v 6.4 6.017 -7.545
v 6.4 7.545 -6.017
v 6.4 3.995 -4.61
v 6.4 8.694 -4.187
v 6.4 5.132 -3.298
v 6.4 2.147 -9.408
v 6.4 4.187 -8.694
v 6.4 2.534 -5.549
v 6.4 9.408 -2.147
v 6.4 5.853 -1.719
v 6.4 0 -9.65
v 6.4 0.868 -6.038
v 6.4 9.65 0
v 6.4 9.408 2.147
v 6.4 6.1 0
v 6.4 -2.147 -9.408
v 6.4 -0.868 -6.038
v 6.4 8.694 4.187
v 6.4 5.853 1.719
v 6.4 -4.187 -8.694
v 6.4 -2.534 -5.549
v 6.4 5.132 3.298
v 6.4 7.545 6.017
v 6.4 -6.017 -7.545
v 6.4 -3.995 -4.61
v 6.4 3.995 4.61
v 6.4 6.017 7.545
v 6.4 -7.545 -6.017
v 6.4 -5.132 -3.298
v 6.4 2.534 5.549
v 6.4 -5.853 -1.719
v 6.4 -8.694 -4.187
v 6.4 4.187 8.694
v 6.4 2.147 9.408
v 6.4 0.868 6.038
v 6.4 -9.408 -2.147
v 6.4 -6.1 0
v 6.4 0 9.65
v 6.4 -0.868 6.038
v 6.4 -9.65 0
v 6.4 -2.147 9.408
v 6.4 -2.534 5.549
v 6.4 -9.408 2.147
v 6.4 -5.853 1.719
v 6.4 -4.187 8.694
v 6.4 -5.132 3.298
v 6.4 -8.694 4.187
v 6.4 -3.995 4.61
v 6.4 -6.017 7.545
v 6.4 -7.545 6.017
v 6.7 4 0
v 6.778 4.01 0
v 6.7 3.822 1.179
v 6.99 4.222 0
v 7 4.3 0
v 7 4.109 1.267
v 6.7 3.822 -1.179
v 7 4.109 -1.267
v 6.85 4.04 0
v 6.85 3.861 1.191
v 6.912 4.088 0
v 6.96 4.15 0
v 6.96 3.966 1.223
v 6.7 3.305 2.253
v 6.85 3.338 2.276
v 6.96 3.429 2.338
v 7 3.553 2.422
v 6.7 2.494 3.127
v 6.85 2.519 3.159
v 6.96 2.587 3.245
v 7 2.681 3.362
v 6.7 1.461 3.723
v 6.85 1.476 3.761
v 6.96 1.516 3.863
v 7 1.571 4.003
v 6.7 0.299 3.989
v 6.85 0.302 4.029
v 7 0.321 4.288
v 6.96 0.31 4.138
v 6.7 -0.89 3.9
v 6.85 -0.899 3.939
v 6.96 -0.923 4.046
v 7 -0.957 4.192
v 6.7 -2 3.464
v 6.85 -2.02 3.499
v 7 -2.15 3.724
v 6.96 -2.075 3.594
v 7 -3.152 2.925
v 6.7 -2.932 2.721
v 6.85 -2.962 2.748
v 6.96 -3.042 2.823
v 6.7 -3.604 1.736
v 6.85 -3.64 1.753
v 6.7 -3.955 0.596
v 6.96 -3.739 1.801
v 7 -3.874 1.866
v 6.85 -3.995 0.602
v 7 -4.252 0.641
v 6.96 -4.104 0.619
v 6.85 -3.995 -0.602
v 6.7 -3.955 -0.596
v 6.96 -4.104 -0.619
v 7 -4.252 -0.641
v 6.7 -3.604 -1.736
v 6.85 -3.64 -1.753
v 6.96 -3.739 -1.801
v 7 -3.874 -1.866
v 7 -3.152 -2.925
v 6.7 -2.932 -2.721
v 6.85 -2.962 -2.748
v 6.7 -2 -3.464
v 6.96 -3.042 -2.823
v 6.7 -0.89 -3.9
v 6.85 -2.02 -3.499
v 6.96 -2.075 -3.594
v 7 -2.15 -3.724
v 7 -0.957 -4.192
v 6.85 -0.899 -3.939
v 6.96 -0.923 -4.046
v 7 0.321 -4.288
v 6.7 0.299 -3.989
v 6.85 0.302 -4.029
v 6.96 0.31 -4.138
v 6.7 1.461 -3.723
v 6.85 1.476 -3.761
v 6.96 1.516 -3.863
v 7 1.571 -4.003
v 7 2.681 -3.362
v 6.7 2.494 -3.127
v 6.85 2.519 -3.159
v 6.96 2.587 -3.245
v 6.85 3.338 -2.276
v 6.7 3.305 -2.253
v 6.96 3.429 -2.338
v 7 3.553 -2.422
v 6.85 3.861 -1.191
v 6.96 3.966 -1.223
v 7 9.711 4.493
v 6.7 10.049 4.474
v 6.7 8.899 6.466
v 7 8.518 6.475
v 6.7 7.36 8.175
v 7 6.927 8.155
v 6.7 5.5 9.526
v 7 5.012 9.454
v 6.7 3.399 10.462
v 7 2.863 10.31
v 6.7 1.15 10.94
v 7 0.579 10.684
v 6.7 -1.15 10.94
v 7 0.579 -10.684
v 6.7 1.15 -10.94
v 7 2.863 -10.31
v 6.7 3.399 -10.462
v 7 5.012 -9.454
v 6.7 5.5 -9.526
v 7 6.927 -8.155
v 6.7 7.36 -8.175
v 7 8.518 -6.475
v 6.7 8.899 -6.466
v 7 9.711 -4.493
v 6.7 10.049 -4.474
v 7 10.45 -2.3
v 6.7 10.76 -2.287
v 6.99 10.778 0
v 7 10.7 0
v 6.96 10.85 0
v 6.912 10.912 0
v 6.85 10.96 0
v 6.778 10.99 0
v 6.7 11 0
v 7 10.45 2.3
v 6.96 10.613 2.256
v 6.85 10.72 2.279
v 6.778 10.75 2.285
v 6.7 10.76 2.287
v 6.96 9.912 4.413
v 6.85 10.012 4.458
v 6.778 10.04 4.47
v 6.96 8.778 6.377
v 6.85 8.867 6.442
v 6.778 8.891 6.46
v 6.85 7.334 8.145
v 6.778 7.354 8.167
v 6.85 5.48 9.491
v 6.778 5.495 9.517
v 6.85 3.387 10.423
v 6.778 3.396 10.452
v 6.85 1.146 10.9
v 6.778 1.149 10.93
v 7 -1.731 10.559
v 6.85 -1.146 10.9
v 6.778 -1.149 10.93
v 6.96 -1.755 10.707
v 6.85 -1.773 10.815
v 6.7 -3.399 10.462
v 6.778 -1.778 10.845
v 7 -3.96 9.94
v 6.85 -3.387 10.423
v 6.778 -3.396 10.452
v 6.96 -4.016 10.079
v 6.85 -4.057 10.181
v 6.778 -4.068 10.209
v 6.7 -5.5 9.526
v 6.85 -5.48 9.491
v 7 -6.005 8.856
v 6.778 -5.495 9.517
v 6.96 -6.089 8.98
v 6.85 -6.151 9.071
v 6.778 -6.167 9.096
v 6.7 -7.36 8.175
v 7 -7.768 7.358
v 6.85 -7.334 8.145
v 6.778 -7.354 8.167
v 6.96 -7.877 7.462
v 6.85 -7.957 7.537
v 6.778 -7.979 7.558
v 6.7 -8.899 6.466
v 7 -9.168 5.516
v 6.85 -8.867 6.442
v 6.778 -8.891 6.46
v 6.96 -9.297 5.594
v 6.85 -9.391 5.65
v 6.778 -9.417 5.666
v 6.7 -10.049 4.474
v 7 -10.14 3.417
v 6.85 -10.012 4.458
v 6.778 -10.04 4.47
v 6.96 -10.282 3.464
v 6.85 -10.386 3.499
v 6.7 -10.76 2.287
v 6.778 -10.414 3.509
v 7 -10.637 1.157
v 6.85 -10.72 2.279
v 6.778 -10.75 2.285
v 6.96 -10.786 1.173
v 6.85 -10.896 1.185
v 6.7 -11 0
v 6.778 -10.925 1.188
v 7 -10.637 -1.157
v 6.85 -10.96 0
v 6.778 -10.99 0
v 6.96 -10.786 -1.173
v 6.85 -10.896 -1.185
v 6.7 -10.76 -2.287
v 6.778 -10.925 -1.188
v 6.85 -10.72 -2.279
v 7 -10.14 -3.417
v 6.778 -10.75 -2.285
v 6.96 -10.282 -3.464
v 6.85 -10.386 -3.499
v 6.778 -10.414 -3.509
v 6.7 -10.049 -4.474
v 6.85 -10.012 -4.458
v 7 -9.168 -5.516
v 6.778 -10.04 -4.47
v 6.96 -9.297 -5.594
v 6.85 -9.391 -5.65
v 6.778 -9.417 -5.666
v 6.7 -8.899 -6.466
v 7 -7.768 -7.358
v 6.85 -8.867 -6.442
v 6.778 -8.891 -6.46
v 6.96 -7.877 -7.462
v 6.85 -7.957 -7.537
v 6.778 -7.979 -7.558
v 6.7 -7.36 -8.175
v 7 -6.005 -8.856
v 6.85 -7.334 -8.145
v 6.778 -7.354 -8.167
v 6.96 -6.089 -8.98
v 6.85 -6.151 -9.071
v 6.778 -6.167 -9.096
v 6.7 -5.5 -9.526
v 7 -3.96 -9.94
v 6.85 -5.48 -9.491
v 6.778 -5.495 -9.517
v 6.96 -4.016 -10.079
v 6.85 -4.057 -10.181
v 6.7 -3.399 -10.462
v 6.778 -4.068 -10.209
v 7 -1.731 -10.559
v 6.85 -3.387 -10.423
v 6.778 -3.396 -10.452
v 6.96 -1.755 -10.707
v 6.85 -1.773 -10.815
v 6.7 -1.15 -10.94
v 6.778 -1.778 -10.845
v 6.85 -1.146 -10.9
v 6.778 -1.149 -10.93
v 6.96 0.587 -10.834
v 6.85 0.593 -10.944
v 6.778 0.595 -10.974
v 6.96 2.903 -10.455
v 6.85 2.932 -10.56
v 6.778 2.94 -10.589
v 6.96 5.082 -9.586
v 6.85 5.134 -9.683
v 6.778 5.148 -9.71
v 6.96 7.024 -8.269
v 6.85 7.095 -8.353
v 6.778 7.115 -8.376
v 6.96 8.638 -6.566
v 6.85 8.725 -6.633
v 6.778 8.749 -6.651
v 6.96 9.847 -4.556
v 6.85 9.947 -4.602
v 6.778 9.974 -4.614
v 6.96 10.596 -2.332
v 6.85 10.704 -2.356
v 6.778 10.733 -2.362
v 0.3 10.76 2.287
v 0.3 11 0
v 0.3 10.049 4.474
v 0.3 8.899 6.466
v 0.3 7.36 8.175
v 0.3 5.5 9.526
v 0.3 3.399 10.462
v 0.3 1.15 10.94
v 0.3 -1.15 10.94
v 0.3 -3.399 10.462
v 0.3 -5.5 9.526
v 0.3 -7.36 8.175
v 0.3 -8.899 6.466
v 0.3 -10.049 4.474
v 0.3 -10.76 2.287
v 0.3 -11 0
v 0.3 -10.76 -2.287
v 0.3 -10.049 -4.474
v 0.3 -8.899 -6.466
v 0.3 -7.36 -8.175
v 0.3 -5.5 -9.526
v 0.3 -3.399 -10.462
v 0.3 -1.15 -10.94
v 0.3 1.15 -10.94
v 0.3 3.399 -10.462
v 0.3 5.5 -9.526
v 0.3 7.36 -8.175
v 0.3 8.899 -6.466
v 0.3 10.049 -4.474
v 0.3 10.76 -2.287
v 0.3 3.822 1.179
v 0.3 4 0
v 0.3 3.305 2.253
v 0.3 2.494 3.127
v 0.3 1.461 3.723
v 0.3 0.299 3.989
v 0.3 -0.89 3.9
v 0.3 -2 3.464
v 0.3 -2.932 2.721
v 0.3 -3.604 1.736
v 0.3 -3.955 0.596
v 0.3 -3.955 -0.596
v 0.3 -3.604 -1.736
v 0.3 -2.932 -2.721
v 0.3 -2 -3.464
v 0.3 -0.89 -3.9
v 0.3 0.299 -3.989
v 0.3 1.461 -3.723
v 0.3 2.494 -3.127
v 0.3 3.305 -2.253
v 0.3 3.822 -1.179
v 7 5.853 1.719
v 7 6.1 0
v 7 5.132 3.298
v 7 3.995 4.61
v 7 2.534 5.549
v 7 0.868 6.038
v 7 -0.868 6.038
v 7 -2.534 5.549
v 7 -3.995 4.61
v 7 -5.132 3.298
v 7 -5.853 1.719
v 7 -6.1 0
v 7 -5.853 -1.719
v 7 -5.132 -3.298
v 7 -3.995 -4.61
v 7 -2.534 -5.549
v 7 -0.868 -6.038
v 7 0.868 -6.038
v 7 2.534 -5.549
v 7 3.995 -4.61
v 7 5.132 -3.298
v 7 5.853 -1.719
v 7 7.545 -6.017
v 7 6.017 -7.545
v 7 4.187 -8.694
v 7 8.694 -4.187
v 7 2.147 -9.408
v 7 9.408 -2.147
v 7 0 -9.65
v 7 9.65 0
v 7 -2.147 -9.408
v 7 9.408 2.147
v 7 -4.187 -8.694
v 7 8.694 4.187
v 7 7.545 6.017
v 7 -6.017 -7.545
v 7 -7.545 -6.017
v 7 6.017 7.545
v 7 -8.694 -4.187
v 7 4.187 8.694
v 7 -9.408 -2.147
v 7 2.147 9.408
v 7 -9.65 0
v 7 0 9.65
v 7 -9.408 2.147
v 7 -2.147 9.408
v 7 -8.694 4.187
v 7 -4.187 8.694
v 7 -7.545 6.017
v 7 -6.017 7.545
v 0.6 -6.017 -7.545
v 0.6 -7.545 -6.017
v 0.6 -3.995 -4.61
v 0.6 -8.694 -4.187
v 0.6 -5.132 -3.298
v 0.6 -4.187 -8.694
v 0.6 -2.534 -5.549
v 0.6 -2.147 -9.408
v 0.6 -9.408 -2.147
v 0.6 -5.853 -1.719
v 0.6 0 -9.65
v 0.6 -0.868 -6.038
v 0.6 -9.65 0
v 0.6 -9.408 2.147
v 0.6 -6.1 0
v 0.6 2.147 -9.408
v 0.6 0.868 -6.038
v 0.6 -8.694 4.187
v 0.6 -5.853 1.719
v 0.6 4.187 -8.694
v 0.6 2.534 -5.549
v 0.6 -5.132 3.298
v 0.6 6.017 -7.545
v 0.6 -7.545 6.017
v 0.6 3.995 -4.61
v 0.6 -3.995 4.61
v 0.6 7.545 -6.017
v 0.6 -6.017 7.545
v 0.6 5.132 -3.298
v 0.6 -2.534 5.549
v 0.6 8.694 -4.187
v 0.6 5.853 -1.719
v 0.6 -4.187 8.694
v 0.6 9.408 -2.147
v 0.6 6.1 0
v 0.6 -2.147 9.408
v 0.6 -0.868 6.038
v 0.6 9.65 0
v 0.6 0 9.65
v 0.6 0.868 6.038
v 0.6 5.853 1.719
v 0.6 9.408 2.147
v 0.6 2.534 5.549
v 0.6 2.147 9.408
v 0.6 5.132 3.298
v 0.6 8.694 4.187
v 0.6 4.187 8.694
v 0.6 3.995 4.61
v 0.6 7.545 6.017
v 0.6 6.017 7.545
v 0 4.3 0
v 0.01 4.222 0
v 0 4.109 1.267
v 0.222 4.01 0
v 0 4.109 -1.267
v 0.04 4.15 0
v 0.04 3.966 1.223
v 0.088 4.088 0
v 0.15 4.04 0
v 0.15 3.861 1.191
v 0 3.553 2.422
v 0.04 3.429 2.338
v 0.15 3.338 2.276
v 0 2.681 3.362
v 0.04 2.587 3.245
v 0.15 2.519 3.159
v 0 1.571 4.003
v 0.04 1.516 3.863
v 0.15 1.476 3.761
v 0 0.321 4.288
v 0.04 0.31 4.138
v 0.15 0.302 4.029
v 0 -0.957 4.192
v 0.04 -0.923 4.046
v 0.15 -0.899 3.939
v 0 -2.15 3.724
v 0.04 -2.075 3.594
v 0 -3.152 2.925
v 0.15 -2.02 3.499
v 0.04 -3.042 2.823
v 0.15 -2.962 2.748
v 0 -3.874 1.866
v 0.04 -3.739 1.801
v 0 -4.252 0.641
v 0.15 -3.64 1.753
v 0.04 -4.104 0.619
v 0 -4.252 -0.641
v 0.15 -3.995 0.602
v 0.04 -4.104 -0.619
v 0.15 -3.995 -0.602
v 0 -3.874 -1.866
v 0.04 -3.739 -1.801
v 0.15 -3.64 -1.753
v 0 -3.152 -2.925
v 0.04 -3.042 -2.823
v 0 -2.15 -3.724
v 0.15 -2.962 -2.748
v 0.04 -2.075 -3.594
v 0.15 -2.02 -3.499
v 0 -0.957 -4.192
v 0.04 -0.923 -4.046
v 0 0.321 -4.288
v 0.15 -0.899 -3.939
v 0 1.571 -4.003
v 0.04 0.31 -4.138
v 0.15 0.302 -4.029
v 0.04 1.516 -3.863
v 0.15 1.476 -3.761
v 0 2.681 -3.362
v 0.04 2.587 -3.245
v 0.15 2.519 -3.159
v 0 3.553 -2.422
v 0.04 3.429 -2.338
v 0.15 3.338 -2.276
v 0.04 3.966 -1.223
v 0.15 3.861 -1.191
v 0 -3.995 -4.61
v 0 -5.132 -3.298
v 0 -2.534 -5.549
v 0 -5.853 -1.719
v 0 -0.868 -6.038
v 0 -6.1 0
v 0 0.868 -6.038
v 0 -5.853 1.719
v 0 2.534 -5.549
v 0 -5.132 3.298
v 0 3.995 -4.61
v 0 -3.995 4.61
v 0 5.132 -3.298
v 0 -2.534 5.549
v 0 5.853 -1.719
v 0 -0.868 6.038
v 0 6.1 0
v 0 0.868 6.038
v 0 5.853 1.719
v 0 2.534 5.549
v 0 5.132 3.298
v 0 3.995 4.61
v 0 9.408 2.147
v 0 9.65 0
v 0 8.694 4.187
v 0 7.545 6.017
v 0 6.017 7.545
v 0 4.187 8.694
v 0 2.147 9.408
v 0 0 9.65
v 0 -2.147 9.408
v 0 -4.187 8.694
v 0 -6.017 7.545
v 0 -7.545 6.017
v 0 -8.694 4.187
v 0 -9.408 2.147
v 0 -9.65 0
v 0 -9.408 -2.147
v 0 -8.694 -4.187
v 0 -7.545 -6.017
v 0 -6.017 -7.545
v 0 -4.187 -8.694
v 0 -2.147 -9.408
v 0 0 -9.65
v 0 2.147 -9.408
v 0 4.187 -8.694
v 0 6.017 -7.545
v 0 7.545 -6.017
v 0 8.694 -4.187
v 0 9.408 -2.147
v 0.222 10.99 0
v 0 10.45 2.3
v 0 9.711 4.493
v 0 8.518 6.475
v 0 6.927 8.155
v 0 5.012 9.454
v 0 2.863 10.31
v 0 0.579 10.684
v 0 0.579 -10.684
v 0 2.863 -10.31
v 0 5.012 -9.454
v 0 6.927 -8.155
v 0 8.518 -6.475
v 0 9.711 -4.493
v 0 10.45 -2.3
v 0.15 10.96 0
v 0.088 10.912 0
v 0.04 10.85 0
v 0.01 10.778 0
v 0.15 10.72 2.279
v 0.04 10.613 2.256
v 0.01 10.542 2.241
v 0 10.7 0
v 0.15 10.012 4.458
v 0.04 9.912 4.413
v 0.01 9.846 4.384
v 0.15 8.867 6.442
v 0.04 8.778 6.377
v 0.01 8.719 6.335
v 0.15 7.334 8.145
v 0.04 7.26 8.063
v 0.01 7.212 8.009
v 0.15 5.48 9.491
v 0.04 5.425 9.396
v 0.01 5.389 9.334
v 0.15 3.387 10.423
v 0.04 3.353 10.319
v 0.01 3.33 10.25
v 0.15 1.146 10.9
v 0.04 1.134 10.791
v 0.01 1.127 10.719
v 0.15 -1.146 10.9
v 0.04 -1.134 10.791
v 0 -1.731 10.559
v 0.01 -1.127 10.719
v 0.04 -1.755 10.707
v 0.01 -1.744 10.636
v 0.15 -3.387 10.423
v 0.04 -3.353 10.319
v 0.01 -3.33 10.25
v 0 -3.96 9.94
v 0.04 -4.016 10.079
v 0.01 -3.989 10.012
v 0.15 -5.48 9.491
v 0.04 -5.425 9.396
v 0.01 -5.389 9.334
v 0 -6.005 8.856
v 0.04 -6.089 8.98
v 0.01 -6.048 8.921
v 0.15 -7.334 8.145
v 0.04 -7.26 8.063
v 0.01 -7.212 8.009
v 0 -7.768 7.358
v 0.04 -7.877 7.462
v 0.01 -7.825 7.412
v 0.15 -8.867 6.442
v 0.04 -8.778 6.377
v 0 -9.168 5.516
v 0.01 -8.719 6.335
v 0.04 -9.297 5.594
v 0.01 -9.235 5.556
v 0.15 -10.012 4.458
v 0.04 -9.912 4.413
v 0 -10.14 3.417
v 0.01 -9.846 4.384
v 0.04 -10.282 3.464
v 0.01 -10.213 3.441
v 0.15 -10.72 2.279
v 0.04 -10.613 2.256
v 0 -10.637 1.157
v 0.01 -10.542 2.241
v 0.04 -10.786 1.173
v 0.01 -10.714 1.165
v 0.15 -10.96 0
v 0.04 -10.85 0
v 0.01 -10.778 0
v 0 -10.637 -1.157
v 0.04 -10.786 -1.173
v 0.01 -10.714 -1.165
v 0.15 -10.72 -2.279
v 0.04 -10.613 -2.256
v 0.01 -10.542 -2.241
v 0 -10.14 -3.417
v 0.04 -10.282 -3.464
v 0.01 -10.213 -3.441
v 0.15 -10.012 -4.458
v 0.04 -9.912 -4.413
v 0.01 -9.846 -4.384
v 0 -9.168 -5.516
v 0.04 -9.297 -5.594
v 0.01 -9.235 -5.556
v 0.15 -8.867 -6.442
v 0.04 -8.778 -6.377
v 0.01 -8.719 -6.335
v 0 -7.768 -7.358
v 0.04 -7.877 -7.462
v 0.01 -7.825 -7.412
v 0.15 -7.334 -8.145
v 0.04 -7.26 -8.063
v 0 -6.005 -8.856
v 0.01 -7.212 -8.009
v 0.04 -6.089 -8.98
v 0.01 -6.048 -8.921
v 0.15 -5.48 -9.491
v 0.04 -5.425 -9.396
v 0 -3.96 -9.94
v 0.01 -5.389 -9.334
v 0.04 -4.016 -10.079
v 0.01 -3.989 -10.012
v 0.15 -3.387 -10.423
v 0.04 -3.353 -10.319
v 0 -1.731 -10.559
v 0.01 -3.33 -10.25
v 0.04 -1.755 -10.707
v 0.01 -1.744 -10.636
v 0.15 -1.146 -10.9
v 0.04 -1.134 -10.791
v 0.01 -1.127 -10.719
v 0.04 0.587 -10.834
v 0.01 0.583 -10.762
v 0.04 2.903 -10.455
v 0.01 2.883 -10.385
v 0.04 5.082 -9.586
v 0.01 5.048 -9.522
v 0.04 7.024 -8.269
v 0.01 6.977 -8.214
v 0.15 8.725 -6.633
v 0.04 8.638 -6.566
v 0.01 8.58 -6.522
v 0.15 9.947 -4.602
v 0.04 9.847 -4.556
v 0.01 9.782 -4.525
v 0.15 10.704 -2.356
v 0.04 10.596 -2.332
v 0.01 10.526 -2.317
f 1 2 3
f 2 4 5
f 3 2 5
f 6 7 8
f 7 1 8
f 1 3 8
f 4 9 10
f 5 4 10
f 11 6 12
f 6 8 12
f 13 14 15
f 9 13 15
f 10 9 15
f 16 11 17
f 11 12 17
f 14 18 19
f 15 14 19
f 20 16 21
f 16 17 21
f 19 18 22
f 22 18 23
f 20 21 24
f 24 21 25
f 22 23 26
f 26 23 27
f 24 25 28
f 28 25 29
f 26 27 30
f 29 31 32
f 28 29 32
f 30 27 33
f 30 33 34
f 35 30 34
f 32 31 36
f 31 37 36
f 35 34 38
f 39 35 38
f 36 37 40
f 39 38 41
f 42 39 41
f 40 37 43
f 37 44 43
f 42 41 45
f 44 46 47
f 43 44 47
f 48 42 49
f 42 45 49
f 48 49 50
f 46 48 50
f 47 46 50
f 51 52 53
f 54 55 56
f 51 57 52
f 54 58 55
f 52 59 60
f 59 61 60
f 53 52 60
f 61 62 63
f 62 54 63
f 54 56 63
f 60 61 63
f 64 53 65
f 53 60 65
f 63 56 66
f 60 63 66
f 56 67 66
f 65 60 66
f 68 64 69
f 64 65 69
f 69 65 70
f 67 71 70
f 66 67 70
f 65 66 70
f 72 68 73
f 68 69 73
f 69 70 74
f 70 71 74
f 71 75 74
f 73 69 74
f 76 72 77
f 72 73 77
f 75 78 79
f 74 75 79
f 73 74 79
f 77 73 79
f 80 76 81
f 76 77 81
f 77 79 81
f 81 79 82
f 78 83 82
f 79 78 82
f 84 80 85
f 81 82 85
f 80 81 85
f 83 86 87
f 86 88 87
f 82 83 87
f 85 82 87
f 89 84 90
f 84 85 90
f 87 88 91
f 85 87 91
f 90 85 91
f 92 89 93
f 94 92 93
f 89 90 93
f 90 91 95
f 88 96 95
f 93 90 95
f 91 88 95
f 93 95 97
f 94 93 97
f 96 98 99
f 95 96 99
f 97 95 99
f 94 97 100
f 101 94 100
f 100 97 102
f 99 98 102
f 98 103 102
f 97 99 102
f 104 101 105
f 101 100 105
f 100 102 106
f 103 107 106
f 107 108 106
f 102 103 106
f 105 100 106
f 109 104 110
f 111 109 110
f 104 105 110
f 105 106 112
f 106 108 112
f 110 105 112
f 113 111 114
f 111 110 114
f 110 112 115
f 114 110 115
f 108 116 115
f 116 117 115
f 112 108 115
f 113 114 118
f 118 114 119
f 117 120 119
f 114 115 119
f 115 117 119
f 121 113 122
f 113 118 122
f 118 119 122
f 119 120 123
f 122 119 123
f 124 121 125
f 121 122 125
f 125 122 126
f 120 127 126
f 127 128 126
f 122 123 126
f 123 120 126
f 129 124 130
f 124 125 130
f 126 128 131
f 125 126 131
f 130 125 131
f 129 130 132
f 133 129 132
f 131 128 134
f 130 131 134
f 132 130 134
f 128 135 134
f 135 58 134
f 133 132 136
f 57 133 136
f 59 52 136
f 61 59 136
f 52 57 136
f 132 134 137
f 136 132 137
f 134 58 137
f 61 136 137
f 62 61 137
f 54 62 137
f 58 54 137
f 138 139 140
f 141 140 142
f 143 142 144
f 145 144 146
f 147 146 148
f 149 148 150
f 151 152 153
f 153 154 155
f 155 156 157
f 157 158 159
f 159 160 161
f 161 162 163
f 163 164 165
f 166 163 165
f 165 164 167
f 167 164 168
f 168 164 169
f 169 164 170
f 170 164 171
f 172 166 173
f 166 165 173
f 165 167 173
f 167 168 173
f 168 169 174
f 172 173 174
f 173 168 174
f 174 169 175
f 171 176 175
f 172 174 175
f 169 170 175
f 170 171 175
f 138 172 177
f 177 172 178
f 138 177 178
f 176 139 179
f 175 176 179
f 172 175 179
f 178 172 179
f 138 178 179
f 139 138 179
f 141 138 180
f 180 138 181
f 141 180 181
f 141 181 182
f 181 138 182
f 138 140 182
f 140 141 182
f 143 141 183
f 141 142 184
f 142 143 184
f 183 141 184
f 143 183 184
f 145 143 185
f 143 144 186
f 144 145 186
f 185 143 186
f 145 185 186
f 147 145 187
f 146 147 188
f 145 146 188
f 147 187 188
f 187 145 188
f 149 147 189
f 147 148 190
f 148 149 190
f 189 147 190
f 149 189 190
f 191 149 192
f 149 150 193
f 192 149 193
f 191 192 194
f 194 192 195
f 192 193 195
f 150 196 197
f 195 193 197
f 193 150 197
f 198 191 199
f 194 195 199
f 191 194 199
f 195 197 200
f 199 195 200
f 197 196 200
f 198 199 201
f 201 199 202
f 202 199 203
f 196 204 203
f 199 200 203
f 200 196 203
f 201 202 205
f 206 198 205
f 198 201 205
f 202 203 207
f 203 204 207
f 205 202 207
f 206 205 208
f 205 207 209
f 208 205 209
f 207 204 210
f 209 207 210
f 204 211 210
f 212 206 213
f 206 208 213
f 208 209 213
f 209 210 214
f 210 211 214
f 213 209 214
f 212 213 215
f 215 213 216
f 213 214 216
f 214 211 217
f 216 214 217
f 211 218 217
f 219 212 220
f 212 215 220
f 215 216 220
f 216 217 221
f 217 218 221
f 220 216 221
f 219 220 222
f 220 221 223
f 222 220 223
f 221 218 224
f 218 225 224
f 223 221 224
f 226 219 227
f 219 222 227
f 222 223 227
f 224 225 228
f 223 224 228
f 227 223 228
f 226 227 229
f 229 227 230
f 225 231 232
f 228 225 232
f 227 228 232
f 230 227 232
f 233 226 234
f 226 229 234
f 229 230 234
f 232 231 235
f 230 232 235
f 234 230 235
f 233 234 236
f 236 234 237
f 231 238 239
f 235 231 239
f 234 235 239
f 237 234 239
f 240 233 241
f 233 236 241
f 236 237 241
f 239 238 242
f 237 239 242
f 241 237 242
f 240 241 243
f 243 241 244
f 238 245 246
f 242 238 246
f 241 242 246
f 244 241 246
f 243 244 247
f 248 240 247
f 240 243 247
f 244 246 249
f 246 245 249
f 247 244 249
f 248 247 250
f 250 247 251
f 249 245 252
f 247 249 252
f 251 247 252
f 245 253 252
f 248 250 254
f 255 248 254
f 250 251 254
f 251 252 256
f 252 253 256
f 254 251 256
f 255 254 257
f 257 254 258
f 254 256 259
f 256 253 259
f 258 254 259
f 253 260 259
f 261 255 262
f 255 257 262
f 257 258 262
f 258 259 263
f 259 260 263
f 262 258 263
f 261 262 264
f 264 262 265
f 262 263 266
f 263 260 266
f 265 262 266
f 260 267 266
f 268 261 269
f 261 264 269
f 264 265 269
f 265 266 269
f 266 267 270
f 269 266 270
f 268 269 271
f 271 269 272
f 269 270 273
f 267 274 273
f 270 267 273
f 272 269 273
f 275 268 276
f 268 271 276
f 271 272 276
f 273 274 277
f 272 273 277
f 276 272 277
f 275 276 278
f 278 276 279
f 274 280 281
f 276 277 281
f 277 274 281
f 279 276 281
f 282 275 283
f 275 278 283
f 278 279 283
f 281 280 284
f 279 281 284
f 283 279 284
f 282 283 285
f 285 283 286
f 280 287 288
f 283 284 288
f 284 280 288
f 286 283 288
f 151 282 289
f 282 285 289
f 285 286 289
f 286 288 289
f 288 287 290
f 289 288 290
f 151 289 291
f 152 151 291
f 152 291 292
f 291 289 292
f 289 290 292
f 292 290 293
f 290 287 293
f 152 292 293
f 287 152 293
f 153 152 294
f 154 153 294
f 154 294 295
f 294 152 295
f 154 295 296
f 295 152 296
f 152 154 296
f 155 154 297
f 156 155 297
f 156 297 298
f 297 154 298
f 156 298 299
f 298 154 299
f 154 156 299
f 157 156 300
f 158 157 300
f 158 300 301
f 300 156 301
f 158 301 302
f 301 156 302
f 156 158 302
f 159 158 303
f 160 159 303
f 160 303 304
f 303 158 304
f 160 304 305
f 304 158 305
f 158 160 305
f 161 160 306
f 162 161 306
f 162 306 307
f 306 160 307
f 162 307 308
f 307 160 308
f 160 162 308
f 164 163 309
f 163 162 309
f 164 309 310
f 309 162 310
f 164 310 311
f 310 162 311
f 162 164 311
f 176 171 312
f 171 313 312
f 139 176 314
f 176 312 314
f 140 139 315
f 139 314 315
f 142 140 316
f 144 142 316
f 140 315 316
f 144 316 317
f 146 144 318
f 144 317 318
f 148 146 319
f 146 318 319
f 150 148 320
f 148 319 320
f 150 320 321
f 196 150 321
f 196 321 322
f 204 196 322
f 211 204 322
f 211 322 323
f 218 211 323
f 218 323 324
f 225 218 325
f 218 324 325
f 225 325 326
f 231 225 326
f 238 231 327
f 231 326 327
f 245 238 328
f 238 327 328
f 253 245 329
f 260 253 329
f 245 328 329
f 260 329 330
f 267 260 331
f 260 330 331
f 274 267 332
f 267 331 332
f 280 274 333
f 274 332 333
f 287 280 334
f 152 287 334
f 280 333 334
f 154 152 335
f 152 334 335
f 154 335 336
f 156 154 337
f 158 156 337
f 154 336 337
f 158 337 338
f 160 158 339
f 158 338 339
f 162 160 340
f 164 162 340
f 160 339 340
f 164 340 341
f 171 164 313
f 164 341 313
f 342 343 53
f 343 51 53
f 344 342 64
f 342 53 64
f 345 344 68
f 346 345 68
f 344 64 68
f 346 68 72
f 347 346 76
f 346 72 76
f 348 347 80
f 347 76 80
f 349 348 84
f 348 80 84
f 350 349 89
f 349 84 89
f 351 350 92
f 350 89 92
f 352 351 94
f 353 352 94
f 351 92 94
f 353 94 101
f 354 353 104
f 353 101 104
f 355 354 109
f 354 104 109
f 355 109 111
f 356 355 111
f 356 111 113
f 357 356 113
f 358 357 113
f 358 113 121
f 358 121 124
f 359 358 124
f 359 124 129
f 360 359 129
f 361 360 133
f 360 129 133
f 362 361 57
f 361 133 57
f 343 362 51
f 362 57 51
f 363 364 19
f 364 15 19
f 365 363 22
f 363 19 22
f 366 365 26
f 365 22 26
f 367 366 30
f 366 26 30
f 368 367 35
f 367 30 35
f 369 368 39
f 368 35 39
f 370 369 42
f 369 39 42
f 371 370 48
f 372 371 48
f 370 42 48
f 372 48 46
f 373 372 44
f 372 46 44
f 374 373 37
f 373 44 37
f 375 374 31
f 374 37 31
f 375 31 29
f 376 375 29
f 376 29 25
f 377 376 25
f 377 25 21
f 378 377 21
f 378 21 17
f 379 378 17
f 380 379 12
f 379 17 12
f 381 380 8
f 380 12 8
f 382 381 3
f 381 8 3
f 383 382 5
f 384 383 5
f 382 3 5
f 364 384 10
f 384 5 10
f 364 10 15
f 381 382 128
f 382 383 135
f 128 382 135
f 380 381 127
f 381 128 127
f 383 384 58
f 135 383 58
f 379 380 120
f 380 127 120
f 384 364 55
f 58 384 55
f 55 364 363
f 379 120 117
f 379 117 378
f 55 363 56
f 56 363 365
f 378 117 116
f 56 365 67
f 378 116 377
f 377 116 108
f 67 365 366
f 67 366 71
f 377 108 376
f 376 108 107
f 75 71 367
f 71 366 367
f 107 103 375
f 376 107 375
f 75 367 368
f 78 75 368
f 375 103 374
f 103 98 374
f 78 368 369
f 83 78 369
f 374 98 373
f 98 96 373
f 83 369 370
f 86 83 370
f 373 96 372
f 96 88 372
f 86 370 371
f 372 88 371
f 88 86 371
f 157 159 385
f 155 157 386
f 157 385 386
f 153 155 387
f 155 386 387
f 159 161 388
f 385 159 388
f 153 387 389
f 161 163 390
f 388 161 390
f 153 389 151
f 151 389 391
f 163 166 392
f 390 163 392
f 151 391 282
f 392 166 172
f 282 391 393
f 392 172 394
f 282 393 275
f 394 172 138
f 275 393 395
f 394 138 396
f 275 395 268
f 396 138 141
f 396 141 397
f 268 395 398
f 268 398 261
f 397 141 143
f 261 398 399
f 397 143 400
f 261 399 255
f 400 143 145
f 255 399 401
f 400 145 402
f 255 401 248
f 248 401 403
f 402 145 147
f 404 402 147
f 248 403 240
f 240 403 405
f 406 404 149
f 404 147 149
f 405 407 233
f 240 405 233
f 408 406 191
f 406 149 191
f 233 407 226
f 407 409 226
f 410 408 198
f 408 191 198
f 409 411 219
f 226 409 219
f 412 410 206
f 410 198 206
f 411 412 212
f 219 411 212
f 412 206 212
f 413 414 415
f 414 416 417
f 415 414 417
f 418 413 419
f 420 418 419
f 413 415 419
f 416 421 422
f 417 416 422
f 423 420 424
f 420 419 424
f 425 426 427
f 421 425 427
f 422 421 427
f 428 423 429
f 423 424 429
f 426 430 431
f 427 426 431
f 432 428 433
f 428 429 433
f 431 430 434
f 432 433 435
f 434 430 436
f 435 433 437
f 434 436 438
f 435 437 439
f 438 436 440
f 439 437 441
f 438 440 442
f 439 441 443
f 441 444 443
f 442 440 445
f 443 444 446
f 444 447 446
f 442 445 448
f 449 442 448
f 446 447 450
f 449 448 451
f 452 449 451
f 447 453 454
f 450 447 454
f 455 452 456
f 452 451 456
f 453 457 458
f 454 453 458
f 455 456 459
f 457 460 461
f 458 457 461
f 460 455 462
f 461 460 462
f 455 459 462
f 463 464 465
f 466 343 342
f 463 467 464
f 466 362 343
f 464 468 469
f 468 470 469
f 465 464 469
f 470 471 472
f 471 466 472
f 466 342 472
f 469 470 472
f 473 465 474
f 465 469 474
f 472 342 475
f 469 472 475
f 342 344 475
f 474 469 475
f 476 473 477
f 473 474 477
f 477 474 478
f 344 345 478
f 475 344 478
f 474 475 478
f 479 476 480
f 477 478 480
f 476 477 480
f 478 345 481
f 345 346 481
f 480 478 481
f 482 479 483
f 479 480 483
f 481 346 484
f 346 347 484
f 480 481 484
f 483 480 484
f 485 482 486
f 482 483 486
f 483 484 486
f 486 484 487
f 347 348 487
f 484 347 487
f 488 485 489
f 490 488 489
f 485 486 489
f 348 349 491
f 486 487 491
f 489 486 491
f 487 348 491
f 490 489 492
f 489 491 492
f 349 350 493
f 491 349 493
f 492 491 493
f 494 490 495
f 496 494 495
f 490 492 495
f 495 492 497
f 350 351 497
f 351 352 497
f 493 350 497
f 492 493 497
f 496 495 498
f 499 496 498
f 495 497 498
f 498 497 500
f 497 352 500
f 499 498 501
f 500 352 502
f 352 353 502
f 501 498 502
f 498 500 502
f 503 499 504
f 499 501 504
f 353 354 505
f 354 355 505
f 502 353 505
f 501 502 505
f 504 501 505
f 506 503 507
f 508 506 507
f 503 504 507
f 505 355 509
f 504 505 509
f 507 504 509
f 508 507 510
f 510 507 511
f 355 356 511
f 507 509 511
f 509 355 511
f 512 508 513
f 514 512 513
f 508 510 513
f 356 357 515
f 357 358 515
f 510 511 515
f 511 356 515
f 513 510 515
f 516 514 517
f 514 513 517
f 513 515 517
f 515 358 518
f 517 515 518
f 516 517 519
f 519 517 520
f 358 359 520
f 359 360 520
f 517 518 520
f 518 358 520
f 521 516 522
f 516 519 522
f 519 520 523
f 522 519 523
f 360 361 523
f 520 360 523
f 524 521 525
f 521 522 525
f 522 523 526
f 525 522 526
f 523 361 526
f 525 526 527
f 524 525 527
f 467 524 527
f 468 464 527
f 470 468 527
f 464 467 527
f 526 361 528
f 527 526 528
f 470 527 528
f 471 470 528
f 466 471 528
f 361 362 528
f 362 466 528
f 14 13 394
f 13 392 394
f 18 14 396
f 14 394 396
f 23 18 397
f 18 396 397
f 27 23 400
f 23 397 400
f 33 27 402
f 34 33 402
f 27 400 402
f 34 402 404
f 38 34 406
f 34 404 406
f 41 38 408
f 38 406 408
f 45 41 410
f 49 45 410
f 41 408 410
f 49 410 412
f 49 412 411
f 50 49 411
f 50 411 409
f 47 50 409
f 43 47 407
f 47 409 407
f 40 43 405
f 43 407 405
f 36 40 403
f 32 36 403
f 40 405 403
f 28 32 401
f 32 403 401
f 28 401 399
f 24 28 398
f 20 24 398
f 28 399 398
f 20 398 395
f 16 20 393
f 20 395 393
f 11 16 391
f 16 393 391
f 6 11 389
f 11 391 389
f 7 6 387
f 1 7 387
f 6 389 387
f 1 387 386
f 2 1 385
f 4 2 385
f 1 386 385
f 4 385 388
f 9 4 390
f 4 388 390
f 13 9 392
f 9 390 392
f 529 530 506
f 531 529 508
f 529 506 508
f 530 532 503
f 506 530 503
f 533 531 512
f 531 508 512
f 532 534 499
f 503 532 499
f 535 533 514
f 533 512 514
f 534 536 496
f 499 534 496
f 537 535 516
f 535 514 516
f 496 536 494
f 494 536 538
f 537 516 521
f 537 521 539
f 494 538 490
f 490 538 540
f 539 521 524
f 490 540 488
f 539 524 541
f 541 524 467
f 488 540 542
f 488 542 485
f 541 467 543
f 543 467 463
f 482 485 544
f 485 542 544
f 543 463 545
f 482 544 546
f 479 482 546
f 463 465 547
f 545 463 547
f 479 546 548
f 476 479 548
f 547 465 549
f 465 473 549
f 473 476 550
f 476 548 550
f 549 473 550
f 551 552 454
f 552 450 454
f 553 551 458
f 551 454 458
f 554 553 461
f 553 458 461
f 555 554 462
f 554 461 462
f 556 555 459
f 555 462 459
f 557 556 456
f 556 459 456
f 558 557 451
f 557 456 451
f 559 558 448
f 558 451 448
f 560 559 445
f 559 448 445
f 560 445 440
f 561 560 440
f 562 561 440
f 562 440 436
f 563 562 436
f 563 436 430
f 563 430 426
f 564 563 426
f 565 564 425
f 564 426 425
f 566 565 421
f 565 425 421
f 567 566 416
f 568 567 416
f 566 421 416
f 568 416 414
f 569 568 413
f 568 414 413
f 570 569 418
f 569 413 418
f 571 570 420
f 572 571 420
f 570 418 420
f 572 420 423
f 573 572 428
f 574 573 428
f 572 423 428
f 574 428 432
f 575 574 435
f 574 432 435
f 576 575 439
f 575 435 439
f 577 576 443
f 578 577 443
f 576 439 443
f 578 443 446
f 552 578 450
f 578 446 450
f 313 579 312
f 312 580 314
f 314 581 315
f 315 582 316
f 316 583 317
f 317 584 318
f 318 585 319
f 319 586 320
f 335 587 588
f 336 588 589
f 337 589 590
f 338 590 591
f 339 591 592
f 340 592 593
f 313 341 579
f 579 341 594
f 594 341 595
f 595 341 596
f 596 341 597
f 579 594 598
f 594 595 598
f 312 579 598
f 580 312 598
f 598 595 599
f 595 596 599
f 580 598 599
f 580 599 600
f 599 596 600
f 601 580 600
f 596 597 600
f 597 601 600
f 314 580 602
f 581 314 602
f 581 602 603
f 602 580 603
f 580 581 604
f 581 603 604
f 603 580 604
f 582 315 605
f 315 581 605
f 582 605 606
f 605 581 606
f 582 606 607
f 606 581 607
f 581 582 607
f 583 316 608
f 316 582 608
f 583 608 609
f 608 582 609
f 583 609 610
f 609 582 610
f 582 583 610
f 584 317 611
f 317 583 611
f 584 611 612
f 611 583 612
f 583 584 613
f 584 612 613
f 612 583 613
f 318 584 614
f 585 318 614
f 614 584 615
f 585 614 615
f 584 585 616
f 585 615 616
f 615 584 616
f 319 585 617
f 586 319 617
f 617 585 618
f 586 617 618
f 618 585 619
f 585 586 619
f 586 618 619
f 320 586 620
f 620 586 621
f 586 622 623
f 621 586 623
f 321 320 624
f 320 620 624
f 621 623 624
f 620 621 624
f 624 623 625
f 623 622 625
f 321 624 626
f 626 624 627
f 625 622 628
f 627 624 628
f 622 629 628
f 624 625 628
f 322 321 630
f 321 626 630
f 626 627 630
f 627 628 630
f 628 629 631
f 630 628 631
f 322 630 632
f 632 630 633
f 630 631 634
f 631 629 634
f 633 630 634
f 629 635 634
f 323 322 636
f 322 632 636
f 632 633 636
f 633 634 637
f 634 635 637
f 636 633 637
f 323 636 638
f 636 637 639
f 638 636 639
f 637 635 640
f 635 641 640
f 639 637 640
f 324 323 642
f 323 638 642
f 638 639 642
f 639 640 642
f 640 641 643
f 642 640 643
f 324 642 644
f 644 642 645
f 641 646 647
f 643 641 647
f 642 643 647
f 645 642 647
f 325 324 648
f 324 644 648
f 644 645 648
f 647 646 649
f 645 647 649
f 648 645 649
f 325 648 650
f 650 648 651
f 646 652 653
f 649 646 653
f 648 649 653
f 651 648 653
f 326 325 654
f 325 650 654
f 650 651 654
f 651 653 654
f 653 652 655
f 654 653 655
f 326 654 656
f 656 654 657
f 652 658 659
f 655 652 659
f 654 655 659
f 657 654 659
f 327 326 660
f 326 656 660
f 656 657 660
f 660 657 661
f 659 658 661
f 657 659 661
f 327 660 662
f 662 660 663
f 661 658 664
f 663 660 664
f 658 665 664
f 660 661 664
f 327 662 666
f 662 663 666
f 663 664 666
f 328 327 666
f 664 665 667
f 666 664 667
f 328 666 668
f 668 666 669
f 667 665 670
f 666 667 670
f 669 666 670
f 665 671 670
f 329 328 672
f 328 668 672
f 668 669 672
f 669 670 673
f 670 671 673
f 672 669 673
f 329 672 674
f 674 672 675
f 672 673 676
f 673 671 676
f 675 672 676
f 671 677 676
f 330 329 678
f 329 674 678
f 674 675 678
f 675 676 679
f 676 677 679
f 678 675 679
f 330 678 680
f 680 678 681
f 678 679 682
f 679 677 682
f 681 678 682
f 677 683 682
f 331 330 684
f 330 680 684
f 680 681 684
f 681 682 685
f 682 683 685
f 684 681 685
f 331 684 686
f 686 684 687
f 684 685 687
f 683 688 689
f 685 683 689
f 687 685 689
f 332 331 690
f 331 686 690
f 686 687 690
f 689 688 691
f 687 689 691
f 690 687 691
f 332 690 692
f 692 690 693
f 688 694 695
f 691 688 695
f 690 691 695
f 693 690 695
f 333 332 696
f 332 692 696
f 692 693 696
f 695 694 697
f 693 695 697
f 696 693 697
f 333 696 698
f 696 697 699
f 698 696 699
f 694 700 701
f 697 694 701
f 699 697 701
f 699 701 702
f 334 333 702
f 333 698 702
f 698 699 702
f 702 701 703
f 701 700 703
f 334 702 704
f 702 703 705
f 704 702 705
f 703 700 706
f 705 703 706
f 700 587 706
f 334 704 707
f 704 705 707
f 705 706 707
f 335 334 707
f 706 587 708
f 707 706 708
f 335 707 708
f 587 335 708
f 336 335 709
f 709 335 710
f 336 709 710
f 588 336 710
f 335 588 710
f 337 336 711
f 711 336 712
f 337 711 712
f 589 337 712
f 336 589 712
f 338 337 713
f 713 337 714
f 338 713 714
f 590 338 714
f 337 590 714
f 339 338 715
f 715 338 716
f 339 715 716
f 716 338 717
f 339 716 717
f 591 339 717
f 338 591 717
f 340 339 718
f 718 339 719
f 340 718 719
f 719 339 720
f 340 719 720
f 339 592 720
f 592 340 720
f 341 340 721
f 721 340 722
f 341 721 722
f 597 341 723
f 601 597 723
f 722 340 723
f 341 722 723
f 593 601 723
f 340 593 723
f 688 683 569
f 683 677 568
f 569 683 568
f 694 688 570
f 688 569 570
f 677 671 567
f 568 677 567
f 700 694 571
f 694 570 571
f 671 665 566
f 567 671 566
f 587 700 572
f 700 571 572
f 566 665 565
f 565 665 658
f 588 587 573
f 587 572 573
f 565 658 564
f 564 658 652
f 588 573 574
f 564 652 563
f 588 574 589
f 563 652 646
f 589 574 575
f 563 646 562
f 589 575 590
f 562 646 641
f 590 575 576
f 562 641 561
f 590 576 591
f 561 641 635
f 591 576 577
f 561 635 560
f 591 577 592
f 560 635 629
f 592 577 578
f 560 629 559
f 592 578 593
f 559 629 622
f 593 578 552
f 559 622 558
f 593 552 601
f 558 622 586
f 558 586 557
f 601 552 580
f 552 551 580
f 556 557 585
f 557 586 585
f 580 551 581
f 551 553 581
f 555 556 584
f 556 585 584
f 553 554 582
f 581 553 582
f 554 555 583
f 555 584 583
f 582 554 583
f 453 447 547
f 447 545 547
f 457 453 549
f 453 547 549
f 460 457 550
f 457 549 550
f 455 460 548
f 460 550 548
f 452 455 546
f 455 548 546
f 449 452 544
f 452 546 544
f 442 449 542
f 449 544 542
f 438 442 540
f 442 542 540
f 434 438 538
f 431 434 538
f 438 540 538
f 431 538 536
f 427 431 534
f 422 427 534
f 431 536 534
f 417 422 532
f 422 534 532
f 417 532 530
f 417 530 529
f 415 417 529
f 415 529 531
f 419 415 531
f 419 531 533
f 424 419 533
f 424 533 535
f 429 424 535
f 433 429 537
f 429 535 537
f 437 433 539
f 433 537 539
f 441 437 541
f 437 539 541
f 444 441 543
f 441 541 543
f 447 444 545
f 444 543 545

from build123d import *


with BuildPart() as part:
    # Sketch1 → Revolve1 (revolve)
    with BuildSketch(Plane.XY):
        with BuildLine():
            Line((0.3, 4), (6.7, 4))
            ThreePointArc((6.7, 4), (6.912132034, 4.087867966), (7, 4.3))
            Line((7, 4.3), (7, 6.1))
            Line((7, 6.1), (6.4, 6.1))
            Line((6.4, 6.1), (6.4, 9.65))
            Line((6.4, 9.65), (7, 9.65))
            Line((7, 9.65), (7, 10.7))
            ThreePointArc((7, 10.7), (6.912132034, 10.912132034), (6.7, 11))
            Line((6.7, 11), (0.3, 11))
            ThreePointArc((0.3, 11), (0.087867966, 10.912132034), (0, 10.7))
            Line((0, 10.7), (0, 9.65))
            Line((0, 9.65), (0.6, 9.65))
            Line((0.6, 9.65), (0.6, 6.1))
            Line((0.6, 6.1), (0, 6.1))
            Line((0, 6.1), (0, 4.3))
            ThreePointArc((0, 4.3), (0.087867966, 4.087867966), (0.3, 4))
        make_face()
    revolve(axis=Axis((-0.002803158, 0, 0), (1, 0, 0)))


solid = part.part
